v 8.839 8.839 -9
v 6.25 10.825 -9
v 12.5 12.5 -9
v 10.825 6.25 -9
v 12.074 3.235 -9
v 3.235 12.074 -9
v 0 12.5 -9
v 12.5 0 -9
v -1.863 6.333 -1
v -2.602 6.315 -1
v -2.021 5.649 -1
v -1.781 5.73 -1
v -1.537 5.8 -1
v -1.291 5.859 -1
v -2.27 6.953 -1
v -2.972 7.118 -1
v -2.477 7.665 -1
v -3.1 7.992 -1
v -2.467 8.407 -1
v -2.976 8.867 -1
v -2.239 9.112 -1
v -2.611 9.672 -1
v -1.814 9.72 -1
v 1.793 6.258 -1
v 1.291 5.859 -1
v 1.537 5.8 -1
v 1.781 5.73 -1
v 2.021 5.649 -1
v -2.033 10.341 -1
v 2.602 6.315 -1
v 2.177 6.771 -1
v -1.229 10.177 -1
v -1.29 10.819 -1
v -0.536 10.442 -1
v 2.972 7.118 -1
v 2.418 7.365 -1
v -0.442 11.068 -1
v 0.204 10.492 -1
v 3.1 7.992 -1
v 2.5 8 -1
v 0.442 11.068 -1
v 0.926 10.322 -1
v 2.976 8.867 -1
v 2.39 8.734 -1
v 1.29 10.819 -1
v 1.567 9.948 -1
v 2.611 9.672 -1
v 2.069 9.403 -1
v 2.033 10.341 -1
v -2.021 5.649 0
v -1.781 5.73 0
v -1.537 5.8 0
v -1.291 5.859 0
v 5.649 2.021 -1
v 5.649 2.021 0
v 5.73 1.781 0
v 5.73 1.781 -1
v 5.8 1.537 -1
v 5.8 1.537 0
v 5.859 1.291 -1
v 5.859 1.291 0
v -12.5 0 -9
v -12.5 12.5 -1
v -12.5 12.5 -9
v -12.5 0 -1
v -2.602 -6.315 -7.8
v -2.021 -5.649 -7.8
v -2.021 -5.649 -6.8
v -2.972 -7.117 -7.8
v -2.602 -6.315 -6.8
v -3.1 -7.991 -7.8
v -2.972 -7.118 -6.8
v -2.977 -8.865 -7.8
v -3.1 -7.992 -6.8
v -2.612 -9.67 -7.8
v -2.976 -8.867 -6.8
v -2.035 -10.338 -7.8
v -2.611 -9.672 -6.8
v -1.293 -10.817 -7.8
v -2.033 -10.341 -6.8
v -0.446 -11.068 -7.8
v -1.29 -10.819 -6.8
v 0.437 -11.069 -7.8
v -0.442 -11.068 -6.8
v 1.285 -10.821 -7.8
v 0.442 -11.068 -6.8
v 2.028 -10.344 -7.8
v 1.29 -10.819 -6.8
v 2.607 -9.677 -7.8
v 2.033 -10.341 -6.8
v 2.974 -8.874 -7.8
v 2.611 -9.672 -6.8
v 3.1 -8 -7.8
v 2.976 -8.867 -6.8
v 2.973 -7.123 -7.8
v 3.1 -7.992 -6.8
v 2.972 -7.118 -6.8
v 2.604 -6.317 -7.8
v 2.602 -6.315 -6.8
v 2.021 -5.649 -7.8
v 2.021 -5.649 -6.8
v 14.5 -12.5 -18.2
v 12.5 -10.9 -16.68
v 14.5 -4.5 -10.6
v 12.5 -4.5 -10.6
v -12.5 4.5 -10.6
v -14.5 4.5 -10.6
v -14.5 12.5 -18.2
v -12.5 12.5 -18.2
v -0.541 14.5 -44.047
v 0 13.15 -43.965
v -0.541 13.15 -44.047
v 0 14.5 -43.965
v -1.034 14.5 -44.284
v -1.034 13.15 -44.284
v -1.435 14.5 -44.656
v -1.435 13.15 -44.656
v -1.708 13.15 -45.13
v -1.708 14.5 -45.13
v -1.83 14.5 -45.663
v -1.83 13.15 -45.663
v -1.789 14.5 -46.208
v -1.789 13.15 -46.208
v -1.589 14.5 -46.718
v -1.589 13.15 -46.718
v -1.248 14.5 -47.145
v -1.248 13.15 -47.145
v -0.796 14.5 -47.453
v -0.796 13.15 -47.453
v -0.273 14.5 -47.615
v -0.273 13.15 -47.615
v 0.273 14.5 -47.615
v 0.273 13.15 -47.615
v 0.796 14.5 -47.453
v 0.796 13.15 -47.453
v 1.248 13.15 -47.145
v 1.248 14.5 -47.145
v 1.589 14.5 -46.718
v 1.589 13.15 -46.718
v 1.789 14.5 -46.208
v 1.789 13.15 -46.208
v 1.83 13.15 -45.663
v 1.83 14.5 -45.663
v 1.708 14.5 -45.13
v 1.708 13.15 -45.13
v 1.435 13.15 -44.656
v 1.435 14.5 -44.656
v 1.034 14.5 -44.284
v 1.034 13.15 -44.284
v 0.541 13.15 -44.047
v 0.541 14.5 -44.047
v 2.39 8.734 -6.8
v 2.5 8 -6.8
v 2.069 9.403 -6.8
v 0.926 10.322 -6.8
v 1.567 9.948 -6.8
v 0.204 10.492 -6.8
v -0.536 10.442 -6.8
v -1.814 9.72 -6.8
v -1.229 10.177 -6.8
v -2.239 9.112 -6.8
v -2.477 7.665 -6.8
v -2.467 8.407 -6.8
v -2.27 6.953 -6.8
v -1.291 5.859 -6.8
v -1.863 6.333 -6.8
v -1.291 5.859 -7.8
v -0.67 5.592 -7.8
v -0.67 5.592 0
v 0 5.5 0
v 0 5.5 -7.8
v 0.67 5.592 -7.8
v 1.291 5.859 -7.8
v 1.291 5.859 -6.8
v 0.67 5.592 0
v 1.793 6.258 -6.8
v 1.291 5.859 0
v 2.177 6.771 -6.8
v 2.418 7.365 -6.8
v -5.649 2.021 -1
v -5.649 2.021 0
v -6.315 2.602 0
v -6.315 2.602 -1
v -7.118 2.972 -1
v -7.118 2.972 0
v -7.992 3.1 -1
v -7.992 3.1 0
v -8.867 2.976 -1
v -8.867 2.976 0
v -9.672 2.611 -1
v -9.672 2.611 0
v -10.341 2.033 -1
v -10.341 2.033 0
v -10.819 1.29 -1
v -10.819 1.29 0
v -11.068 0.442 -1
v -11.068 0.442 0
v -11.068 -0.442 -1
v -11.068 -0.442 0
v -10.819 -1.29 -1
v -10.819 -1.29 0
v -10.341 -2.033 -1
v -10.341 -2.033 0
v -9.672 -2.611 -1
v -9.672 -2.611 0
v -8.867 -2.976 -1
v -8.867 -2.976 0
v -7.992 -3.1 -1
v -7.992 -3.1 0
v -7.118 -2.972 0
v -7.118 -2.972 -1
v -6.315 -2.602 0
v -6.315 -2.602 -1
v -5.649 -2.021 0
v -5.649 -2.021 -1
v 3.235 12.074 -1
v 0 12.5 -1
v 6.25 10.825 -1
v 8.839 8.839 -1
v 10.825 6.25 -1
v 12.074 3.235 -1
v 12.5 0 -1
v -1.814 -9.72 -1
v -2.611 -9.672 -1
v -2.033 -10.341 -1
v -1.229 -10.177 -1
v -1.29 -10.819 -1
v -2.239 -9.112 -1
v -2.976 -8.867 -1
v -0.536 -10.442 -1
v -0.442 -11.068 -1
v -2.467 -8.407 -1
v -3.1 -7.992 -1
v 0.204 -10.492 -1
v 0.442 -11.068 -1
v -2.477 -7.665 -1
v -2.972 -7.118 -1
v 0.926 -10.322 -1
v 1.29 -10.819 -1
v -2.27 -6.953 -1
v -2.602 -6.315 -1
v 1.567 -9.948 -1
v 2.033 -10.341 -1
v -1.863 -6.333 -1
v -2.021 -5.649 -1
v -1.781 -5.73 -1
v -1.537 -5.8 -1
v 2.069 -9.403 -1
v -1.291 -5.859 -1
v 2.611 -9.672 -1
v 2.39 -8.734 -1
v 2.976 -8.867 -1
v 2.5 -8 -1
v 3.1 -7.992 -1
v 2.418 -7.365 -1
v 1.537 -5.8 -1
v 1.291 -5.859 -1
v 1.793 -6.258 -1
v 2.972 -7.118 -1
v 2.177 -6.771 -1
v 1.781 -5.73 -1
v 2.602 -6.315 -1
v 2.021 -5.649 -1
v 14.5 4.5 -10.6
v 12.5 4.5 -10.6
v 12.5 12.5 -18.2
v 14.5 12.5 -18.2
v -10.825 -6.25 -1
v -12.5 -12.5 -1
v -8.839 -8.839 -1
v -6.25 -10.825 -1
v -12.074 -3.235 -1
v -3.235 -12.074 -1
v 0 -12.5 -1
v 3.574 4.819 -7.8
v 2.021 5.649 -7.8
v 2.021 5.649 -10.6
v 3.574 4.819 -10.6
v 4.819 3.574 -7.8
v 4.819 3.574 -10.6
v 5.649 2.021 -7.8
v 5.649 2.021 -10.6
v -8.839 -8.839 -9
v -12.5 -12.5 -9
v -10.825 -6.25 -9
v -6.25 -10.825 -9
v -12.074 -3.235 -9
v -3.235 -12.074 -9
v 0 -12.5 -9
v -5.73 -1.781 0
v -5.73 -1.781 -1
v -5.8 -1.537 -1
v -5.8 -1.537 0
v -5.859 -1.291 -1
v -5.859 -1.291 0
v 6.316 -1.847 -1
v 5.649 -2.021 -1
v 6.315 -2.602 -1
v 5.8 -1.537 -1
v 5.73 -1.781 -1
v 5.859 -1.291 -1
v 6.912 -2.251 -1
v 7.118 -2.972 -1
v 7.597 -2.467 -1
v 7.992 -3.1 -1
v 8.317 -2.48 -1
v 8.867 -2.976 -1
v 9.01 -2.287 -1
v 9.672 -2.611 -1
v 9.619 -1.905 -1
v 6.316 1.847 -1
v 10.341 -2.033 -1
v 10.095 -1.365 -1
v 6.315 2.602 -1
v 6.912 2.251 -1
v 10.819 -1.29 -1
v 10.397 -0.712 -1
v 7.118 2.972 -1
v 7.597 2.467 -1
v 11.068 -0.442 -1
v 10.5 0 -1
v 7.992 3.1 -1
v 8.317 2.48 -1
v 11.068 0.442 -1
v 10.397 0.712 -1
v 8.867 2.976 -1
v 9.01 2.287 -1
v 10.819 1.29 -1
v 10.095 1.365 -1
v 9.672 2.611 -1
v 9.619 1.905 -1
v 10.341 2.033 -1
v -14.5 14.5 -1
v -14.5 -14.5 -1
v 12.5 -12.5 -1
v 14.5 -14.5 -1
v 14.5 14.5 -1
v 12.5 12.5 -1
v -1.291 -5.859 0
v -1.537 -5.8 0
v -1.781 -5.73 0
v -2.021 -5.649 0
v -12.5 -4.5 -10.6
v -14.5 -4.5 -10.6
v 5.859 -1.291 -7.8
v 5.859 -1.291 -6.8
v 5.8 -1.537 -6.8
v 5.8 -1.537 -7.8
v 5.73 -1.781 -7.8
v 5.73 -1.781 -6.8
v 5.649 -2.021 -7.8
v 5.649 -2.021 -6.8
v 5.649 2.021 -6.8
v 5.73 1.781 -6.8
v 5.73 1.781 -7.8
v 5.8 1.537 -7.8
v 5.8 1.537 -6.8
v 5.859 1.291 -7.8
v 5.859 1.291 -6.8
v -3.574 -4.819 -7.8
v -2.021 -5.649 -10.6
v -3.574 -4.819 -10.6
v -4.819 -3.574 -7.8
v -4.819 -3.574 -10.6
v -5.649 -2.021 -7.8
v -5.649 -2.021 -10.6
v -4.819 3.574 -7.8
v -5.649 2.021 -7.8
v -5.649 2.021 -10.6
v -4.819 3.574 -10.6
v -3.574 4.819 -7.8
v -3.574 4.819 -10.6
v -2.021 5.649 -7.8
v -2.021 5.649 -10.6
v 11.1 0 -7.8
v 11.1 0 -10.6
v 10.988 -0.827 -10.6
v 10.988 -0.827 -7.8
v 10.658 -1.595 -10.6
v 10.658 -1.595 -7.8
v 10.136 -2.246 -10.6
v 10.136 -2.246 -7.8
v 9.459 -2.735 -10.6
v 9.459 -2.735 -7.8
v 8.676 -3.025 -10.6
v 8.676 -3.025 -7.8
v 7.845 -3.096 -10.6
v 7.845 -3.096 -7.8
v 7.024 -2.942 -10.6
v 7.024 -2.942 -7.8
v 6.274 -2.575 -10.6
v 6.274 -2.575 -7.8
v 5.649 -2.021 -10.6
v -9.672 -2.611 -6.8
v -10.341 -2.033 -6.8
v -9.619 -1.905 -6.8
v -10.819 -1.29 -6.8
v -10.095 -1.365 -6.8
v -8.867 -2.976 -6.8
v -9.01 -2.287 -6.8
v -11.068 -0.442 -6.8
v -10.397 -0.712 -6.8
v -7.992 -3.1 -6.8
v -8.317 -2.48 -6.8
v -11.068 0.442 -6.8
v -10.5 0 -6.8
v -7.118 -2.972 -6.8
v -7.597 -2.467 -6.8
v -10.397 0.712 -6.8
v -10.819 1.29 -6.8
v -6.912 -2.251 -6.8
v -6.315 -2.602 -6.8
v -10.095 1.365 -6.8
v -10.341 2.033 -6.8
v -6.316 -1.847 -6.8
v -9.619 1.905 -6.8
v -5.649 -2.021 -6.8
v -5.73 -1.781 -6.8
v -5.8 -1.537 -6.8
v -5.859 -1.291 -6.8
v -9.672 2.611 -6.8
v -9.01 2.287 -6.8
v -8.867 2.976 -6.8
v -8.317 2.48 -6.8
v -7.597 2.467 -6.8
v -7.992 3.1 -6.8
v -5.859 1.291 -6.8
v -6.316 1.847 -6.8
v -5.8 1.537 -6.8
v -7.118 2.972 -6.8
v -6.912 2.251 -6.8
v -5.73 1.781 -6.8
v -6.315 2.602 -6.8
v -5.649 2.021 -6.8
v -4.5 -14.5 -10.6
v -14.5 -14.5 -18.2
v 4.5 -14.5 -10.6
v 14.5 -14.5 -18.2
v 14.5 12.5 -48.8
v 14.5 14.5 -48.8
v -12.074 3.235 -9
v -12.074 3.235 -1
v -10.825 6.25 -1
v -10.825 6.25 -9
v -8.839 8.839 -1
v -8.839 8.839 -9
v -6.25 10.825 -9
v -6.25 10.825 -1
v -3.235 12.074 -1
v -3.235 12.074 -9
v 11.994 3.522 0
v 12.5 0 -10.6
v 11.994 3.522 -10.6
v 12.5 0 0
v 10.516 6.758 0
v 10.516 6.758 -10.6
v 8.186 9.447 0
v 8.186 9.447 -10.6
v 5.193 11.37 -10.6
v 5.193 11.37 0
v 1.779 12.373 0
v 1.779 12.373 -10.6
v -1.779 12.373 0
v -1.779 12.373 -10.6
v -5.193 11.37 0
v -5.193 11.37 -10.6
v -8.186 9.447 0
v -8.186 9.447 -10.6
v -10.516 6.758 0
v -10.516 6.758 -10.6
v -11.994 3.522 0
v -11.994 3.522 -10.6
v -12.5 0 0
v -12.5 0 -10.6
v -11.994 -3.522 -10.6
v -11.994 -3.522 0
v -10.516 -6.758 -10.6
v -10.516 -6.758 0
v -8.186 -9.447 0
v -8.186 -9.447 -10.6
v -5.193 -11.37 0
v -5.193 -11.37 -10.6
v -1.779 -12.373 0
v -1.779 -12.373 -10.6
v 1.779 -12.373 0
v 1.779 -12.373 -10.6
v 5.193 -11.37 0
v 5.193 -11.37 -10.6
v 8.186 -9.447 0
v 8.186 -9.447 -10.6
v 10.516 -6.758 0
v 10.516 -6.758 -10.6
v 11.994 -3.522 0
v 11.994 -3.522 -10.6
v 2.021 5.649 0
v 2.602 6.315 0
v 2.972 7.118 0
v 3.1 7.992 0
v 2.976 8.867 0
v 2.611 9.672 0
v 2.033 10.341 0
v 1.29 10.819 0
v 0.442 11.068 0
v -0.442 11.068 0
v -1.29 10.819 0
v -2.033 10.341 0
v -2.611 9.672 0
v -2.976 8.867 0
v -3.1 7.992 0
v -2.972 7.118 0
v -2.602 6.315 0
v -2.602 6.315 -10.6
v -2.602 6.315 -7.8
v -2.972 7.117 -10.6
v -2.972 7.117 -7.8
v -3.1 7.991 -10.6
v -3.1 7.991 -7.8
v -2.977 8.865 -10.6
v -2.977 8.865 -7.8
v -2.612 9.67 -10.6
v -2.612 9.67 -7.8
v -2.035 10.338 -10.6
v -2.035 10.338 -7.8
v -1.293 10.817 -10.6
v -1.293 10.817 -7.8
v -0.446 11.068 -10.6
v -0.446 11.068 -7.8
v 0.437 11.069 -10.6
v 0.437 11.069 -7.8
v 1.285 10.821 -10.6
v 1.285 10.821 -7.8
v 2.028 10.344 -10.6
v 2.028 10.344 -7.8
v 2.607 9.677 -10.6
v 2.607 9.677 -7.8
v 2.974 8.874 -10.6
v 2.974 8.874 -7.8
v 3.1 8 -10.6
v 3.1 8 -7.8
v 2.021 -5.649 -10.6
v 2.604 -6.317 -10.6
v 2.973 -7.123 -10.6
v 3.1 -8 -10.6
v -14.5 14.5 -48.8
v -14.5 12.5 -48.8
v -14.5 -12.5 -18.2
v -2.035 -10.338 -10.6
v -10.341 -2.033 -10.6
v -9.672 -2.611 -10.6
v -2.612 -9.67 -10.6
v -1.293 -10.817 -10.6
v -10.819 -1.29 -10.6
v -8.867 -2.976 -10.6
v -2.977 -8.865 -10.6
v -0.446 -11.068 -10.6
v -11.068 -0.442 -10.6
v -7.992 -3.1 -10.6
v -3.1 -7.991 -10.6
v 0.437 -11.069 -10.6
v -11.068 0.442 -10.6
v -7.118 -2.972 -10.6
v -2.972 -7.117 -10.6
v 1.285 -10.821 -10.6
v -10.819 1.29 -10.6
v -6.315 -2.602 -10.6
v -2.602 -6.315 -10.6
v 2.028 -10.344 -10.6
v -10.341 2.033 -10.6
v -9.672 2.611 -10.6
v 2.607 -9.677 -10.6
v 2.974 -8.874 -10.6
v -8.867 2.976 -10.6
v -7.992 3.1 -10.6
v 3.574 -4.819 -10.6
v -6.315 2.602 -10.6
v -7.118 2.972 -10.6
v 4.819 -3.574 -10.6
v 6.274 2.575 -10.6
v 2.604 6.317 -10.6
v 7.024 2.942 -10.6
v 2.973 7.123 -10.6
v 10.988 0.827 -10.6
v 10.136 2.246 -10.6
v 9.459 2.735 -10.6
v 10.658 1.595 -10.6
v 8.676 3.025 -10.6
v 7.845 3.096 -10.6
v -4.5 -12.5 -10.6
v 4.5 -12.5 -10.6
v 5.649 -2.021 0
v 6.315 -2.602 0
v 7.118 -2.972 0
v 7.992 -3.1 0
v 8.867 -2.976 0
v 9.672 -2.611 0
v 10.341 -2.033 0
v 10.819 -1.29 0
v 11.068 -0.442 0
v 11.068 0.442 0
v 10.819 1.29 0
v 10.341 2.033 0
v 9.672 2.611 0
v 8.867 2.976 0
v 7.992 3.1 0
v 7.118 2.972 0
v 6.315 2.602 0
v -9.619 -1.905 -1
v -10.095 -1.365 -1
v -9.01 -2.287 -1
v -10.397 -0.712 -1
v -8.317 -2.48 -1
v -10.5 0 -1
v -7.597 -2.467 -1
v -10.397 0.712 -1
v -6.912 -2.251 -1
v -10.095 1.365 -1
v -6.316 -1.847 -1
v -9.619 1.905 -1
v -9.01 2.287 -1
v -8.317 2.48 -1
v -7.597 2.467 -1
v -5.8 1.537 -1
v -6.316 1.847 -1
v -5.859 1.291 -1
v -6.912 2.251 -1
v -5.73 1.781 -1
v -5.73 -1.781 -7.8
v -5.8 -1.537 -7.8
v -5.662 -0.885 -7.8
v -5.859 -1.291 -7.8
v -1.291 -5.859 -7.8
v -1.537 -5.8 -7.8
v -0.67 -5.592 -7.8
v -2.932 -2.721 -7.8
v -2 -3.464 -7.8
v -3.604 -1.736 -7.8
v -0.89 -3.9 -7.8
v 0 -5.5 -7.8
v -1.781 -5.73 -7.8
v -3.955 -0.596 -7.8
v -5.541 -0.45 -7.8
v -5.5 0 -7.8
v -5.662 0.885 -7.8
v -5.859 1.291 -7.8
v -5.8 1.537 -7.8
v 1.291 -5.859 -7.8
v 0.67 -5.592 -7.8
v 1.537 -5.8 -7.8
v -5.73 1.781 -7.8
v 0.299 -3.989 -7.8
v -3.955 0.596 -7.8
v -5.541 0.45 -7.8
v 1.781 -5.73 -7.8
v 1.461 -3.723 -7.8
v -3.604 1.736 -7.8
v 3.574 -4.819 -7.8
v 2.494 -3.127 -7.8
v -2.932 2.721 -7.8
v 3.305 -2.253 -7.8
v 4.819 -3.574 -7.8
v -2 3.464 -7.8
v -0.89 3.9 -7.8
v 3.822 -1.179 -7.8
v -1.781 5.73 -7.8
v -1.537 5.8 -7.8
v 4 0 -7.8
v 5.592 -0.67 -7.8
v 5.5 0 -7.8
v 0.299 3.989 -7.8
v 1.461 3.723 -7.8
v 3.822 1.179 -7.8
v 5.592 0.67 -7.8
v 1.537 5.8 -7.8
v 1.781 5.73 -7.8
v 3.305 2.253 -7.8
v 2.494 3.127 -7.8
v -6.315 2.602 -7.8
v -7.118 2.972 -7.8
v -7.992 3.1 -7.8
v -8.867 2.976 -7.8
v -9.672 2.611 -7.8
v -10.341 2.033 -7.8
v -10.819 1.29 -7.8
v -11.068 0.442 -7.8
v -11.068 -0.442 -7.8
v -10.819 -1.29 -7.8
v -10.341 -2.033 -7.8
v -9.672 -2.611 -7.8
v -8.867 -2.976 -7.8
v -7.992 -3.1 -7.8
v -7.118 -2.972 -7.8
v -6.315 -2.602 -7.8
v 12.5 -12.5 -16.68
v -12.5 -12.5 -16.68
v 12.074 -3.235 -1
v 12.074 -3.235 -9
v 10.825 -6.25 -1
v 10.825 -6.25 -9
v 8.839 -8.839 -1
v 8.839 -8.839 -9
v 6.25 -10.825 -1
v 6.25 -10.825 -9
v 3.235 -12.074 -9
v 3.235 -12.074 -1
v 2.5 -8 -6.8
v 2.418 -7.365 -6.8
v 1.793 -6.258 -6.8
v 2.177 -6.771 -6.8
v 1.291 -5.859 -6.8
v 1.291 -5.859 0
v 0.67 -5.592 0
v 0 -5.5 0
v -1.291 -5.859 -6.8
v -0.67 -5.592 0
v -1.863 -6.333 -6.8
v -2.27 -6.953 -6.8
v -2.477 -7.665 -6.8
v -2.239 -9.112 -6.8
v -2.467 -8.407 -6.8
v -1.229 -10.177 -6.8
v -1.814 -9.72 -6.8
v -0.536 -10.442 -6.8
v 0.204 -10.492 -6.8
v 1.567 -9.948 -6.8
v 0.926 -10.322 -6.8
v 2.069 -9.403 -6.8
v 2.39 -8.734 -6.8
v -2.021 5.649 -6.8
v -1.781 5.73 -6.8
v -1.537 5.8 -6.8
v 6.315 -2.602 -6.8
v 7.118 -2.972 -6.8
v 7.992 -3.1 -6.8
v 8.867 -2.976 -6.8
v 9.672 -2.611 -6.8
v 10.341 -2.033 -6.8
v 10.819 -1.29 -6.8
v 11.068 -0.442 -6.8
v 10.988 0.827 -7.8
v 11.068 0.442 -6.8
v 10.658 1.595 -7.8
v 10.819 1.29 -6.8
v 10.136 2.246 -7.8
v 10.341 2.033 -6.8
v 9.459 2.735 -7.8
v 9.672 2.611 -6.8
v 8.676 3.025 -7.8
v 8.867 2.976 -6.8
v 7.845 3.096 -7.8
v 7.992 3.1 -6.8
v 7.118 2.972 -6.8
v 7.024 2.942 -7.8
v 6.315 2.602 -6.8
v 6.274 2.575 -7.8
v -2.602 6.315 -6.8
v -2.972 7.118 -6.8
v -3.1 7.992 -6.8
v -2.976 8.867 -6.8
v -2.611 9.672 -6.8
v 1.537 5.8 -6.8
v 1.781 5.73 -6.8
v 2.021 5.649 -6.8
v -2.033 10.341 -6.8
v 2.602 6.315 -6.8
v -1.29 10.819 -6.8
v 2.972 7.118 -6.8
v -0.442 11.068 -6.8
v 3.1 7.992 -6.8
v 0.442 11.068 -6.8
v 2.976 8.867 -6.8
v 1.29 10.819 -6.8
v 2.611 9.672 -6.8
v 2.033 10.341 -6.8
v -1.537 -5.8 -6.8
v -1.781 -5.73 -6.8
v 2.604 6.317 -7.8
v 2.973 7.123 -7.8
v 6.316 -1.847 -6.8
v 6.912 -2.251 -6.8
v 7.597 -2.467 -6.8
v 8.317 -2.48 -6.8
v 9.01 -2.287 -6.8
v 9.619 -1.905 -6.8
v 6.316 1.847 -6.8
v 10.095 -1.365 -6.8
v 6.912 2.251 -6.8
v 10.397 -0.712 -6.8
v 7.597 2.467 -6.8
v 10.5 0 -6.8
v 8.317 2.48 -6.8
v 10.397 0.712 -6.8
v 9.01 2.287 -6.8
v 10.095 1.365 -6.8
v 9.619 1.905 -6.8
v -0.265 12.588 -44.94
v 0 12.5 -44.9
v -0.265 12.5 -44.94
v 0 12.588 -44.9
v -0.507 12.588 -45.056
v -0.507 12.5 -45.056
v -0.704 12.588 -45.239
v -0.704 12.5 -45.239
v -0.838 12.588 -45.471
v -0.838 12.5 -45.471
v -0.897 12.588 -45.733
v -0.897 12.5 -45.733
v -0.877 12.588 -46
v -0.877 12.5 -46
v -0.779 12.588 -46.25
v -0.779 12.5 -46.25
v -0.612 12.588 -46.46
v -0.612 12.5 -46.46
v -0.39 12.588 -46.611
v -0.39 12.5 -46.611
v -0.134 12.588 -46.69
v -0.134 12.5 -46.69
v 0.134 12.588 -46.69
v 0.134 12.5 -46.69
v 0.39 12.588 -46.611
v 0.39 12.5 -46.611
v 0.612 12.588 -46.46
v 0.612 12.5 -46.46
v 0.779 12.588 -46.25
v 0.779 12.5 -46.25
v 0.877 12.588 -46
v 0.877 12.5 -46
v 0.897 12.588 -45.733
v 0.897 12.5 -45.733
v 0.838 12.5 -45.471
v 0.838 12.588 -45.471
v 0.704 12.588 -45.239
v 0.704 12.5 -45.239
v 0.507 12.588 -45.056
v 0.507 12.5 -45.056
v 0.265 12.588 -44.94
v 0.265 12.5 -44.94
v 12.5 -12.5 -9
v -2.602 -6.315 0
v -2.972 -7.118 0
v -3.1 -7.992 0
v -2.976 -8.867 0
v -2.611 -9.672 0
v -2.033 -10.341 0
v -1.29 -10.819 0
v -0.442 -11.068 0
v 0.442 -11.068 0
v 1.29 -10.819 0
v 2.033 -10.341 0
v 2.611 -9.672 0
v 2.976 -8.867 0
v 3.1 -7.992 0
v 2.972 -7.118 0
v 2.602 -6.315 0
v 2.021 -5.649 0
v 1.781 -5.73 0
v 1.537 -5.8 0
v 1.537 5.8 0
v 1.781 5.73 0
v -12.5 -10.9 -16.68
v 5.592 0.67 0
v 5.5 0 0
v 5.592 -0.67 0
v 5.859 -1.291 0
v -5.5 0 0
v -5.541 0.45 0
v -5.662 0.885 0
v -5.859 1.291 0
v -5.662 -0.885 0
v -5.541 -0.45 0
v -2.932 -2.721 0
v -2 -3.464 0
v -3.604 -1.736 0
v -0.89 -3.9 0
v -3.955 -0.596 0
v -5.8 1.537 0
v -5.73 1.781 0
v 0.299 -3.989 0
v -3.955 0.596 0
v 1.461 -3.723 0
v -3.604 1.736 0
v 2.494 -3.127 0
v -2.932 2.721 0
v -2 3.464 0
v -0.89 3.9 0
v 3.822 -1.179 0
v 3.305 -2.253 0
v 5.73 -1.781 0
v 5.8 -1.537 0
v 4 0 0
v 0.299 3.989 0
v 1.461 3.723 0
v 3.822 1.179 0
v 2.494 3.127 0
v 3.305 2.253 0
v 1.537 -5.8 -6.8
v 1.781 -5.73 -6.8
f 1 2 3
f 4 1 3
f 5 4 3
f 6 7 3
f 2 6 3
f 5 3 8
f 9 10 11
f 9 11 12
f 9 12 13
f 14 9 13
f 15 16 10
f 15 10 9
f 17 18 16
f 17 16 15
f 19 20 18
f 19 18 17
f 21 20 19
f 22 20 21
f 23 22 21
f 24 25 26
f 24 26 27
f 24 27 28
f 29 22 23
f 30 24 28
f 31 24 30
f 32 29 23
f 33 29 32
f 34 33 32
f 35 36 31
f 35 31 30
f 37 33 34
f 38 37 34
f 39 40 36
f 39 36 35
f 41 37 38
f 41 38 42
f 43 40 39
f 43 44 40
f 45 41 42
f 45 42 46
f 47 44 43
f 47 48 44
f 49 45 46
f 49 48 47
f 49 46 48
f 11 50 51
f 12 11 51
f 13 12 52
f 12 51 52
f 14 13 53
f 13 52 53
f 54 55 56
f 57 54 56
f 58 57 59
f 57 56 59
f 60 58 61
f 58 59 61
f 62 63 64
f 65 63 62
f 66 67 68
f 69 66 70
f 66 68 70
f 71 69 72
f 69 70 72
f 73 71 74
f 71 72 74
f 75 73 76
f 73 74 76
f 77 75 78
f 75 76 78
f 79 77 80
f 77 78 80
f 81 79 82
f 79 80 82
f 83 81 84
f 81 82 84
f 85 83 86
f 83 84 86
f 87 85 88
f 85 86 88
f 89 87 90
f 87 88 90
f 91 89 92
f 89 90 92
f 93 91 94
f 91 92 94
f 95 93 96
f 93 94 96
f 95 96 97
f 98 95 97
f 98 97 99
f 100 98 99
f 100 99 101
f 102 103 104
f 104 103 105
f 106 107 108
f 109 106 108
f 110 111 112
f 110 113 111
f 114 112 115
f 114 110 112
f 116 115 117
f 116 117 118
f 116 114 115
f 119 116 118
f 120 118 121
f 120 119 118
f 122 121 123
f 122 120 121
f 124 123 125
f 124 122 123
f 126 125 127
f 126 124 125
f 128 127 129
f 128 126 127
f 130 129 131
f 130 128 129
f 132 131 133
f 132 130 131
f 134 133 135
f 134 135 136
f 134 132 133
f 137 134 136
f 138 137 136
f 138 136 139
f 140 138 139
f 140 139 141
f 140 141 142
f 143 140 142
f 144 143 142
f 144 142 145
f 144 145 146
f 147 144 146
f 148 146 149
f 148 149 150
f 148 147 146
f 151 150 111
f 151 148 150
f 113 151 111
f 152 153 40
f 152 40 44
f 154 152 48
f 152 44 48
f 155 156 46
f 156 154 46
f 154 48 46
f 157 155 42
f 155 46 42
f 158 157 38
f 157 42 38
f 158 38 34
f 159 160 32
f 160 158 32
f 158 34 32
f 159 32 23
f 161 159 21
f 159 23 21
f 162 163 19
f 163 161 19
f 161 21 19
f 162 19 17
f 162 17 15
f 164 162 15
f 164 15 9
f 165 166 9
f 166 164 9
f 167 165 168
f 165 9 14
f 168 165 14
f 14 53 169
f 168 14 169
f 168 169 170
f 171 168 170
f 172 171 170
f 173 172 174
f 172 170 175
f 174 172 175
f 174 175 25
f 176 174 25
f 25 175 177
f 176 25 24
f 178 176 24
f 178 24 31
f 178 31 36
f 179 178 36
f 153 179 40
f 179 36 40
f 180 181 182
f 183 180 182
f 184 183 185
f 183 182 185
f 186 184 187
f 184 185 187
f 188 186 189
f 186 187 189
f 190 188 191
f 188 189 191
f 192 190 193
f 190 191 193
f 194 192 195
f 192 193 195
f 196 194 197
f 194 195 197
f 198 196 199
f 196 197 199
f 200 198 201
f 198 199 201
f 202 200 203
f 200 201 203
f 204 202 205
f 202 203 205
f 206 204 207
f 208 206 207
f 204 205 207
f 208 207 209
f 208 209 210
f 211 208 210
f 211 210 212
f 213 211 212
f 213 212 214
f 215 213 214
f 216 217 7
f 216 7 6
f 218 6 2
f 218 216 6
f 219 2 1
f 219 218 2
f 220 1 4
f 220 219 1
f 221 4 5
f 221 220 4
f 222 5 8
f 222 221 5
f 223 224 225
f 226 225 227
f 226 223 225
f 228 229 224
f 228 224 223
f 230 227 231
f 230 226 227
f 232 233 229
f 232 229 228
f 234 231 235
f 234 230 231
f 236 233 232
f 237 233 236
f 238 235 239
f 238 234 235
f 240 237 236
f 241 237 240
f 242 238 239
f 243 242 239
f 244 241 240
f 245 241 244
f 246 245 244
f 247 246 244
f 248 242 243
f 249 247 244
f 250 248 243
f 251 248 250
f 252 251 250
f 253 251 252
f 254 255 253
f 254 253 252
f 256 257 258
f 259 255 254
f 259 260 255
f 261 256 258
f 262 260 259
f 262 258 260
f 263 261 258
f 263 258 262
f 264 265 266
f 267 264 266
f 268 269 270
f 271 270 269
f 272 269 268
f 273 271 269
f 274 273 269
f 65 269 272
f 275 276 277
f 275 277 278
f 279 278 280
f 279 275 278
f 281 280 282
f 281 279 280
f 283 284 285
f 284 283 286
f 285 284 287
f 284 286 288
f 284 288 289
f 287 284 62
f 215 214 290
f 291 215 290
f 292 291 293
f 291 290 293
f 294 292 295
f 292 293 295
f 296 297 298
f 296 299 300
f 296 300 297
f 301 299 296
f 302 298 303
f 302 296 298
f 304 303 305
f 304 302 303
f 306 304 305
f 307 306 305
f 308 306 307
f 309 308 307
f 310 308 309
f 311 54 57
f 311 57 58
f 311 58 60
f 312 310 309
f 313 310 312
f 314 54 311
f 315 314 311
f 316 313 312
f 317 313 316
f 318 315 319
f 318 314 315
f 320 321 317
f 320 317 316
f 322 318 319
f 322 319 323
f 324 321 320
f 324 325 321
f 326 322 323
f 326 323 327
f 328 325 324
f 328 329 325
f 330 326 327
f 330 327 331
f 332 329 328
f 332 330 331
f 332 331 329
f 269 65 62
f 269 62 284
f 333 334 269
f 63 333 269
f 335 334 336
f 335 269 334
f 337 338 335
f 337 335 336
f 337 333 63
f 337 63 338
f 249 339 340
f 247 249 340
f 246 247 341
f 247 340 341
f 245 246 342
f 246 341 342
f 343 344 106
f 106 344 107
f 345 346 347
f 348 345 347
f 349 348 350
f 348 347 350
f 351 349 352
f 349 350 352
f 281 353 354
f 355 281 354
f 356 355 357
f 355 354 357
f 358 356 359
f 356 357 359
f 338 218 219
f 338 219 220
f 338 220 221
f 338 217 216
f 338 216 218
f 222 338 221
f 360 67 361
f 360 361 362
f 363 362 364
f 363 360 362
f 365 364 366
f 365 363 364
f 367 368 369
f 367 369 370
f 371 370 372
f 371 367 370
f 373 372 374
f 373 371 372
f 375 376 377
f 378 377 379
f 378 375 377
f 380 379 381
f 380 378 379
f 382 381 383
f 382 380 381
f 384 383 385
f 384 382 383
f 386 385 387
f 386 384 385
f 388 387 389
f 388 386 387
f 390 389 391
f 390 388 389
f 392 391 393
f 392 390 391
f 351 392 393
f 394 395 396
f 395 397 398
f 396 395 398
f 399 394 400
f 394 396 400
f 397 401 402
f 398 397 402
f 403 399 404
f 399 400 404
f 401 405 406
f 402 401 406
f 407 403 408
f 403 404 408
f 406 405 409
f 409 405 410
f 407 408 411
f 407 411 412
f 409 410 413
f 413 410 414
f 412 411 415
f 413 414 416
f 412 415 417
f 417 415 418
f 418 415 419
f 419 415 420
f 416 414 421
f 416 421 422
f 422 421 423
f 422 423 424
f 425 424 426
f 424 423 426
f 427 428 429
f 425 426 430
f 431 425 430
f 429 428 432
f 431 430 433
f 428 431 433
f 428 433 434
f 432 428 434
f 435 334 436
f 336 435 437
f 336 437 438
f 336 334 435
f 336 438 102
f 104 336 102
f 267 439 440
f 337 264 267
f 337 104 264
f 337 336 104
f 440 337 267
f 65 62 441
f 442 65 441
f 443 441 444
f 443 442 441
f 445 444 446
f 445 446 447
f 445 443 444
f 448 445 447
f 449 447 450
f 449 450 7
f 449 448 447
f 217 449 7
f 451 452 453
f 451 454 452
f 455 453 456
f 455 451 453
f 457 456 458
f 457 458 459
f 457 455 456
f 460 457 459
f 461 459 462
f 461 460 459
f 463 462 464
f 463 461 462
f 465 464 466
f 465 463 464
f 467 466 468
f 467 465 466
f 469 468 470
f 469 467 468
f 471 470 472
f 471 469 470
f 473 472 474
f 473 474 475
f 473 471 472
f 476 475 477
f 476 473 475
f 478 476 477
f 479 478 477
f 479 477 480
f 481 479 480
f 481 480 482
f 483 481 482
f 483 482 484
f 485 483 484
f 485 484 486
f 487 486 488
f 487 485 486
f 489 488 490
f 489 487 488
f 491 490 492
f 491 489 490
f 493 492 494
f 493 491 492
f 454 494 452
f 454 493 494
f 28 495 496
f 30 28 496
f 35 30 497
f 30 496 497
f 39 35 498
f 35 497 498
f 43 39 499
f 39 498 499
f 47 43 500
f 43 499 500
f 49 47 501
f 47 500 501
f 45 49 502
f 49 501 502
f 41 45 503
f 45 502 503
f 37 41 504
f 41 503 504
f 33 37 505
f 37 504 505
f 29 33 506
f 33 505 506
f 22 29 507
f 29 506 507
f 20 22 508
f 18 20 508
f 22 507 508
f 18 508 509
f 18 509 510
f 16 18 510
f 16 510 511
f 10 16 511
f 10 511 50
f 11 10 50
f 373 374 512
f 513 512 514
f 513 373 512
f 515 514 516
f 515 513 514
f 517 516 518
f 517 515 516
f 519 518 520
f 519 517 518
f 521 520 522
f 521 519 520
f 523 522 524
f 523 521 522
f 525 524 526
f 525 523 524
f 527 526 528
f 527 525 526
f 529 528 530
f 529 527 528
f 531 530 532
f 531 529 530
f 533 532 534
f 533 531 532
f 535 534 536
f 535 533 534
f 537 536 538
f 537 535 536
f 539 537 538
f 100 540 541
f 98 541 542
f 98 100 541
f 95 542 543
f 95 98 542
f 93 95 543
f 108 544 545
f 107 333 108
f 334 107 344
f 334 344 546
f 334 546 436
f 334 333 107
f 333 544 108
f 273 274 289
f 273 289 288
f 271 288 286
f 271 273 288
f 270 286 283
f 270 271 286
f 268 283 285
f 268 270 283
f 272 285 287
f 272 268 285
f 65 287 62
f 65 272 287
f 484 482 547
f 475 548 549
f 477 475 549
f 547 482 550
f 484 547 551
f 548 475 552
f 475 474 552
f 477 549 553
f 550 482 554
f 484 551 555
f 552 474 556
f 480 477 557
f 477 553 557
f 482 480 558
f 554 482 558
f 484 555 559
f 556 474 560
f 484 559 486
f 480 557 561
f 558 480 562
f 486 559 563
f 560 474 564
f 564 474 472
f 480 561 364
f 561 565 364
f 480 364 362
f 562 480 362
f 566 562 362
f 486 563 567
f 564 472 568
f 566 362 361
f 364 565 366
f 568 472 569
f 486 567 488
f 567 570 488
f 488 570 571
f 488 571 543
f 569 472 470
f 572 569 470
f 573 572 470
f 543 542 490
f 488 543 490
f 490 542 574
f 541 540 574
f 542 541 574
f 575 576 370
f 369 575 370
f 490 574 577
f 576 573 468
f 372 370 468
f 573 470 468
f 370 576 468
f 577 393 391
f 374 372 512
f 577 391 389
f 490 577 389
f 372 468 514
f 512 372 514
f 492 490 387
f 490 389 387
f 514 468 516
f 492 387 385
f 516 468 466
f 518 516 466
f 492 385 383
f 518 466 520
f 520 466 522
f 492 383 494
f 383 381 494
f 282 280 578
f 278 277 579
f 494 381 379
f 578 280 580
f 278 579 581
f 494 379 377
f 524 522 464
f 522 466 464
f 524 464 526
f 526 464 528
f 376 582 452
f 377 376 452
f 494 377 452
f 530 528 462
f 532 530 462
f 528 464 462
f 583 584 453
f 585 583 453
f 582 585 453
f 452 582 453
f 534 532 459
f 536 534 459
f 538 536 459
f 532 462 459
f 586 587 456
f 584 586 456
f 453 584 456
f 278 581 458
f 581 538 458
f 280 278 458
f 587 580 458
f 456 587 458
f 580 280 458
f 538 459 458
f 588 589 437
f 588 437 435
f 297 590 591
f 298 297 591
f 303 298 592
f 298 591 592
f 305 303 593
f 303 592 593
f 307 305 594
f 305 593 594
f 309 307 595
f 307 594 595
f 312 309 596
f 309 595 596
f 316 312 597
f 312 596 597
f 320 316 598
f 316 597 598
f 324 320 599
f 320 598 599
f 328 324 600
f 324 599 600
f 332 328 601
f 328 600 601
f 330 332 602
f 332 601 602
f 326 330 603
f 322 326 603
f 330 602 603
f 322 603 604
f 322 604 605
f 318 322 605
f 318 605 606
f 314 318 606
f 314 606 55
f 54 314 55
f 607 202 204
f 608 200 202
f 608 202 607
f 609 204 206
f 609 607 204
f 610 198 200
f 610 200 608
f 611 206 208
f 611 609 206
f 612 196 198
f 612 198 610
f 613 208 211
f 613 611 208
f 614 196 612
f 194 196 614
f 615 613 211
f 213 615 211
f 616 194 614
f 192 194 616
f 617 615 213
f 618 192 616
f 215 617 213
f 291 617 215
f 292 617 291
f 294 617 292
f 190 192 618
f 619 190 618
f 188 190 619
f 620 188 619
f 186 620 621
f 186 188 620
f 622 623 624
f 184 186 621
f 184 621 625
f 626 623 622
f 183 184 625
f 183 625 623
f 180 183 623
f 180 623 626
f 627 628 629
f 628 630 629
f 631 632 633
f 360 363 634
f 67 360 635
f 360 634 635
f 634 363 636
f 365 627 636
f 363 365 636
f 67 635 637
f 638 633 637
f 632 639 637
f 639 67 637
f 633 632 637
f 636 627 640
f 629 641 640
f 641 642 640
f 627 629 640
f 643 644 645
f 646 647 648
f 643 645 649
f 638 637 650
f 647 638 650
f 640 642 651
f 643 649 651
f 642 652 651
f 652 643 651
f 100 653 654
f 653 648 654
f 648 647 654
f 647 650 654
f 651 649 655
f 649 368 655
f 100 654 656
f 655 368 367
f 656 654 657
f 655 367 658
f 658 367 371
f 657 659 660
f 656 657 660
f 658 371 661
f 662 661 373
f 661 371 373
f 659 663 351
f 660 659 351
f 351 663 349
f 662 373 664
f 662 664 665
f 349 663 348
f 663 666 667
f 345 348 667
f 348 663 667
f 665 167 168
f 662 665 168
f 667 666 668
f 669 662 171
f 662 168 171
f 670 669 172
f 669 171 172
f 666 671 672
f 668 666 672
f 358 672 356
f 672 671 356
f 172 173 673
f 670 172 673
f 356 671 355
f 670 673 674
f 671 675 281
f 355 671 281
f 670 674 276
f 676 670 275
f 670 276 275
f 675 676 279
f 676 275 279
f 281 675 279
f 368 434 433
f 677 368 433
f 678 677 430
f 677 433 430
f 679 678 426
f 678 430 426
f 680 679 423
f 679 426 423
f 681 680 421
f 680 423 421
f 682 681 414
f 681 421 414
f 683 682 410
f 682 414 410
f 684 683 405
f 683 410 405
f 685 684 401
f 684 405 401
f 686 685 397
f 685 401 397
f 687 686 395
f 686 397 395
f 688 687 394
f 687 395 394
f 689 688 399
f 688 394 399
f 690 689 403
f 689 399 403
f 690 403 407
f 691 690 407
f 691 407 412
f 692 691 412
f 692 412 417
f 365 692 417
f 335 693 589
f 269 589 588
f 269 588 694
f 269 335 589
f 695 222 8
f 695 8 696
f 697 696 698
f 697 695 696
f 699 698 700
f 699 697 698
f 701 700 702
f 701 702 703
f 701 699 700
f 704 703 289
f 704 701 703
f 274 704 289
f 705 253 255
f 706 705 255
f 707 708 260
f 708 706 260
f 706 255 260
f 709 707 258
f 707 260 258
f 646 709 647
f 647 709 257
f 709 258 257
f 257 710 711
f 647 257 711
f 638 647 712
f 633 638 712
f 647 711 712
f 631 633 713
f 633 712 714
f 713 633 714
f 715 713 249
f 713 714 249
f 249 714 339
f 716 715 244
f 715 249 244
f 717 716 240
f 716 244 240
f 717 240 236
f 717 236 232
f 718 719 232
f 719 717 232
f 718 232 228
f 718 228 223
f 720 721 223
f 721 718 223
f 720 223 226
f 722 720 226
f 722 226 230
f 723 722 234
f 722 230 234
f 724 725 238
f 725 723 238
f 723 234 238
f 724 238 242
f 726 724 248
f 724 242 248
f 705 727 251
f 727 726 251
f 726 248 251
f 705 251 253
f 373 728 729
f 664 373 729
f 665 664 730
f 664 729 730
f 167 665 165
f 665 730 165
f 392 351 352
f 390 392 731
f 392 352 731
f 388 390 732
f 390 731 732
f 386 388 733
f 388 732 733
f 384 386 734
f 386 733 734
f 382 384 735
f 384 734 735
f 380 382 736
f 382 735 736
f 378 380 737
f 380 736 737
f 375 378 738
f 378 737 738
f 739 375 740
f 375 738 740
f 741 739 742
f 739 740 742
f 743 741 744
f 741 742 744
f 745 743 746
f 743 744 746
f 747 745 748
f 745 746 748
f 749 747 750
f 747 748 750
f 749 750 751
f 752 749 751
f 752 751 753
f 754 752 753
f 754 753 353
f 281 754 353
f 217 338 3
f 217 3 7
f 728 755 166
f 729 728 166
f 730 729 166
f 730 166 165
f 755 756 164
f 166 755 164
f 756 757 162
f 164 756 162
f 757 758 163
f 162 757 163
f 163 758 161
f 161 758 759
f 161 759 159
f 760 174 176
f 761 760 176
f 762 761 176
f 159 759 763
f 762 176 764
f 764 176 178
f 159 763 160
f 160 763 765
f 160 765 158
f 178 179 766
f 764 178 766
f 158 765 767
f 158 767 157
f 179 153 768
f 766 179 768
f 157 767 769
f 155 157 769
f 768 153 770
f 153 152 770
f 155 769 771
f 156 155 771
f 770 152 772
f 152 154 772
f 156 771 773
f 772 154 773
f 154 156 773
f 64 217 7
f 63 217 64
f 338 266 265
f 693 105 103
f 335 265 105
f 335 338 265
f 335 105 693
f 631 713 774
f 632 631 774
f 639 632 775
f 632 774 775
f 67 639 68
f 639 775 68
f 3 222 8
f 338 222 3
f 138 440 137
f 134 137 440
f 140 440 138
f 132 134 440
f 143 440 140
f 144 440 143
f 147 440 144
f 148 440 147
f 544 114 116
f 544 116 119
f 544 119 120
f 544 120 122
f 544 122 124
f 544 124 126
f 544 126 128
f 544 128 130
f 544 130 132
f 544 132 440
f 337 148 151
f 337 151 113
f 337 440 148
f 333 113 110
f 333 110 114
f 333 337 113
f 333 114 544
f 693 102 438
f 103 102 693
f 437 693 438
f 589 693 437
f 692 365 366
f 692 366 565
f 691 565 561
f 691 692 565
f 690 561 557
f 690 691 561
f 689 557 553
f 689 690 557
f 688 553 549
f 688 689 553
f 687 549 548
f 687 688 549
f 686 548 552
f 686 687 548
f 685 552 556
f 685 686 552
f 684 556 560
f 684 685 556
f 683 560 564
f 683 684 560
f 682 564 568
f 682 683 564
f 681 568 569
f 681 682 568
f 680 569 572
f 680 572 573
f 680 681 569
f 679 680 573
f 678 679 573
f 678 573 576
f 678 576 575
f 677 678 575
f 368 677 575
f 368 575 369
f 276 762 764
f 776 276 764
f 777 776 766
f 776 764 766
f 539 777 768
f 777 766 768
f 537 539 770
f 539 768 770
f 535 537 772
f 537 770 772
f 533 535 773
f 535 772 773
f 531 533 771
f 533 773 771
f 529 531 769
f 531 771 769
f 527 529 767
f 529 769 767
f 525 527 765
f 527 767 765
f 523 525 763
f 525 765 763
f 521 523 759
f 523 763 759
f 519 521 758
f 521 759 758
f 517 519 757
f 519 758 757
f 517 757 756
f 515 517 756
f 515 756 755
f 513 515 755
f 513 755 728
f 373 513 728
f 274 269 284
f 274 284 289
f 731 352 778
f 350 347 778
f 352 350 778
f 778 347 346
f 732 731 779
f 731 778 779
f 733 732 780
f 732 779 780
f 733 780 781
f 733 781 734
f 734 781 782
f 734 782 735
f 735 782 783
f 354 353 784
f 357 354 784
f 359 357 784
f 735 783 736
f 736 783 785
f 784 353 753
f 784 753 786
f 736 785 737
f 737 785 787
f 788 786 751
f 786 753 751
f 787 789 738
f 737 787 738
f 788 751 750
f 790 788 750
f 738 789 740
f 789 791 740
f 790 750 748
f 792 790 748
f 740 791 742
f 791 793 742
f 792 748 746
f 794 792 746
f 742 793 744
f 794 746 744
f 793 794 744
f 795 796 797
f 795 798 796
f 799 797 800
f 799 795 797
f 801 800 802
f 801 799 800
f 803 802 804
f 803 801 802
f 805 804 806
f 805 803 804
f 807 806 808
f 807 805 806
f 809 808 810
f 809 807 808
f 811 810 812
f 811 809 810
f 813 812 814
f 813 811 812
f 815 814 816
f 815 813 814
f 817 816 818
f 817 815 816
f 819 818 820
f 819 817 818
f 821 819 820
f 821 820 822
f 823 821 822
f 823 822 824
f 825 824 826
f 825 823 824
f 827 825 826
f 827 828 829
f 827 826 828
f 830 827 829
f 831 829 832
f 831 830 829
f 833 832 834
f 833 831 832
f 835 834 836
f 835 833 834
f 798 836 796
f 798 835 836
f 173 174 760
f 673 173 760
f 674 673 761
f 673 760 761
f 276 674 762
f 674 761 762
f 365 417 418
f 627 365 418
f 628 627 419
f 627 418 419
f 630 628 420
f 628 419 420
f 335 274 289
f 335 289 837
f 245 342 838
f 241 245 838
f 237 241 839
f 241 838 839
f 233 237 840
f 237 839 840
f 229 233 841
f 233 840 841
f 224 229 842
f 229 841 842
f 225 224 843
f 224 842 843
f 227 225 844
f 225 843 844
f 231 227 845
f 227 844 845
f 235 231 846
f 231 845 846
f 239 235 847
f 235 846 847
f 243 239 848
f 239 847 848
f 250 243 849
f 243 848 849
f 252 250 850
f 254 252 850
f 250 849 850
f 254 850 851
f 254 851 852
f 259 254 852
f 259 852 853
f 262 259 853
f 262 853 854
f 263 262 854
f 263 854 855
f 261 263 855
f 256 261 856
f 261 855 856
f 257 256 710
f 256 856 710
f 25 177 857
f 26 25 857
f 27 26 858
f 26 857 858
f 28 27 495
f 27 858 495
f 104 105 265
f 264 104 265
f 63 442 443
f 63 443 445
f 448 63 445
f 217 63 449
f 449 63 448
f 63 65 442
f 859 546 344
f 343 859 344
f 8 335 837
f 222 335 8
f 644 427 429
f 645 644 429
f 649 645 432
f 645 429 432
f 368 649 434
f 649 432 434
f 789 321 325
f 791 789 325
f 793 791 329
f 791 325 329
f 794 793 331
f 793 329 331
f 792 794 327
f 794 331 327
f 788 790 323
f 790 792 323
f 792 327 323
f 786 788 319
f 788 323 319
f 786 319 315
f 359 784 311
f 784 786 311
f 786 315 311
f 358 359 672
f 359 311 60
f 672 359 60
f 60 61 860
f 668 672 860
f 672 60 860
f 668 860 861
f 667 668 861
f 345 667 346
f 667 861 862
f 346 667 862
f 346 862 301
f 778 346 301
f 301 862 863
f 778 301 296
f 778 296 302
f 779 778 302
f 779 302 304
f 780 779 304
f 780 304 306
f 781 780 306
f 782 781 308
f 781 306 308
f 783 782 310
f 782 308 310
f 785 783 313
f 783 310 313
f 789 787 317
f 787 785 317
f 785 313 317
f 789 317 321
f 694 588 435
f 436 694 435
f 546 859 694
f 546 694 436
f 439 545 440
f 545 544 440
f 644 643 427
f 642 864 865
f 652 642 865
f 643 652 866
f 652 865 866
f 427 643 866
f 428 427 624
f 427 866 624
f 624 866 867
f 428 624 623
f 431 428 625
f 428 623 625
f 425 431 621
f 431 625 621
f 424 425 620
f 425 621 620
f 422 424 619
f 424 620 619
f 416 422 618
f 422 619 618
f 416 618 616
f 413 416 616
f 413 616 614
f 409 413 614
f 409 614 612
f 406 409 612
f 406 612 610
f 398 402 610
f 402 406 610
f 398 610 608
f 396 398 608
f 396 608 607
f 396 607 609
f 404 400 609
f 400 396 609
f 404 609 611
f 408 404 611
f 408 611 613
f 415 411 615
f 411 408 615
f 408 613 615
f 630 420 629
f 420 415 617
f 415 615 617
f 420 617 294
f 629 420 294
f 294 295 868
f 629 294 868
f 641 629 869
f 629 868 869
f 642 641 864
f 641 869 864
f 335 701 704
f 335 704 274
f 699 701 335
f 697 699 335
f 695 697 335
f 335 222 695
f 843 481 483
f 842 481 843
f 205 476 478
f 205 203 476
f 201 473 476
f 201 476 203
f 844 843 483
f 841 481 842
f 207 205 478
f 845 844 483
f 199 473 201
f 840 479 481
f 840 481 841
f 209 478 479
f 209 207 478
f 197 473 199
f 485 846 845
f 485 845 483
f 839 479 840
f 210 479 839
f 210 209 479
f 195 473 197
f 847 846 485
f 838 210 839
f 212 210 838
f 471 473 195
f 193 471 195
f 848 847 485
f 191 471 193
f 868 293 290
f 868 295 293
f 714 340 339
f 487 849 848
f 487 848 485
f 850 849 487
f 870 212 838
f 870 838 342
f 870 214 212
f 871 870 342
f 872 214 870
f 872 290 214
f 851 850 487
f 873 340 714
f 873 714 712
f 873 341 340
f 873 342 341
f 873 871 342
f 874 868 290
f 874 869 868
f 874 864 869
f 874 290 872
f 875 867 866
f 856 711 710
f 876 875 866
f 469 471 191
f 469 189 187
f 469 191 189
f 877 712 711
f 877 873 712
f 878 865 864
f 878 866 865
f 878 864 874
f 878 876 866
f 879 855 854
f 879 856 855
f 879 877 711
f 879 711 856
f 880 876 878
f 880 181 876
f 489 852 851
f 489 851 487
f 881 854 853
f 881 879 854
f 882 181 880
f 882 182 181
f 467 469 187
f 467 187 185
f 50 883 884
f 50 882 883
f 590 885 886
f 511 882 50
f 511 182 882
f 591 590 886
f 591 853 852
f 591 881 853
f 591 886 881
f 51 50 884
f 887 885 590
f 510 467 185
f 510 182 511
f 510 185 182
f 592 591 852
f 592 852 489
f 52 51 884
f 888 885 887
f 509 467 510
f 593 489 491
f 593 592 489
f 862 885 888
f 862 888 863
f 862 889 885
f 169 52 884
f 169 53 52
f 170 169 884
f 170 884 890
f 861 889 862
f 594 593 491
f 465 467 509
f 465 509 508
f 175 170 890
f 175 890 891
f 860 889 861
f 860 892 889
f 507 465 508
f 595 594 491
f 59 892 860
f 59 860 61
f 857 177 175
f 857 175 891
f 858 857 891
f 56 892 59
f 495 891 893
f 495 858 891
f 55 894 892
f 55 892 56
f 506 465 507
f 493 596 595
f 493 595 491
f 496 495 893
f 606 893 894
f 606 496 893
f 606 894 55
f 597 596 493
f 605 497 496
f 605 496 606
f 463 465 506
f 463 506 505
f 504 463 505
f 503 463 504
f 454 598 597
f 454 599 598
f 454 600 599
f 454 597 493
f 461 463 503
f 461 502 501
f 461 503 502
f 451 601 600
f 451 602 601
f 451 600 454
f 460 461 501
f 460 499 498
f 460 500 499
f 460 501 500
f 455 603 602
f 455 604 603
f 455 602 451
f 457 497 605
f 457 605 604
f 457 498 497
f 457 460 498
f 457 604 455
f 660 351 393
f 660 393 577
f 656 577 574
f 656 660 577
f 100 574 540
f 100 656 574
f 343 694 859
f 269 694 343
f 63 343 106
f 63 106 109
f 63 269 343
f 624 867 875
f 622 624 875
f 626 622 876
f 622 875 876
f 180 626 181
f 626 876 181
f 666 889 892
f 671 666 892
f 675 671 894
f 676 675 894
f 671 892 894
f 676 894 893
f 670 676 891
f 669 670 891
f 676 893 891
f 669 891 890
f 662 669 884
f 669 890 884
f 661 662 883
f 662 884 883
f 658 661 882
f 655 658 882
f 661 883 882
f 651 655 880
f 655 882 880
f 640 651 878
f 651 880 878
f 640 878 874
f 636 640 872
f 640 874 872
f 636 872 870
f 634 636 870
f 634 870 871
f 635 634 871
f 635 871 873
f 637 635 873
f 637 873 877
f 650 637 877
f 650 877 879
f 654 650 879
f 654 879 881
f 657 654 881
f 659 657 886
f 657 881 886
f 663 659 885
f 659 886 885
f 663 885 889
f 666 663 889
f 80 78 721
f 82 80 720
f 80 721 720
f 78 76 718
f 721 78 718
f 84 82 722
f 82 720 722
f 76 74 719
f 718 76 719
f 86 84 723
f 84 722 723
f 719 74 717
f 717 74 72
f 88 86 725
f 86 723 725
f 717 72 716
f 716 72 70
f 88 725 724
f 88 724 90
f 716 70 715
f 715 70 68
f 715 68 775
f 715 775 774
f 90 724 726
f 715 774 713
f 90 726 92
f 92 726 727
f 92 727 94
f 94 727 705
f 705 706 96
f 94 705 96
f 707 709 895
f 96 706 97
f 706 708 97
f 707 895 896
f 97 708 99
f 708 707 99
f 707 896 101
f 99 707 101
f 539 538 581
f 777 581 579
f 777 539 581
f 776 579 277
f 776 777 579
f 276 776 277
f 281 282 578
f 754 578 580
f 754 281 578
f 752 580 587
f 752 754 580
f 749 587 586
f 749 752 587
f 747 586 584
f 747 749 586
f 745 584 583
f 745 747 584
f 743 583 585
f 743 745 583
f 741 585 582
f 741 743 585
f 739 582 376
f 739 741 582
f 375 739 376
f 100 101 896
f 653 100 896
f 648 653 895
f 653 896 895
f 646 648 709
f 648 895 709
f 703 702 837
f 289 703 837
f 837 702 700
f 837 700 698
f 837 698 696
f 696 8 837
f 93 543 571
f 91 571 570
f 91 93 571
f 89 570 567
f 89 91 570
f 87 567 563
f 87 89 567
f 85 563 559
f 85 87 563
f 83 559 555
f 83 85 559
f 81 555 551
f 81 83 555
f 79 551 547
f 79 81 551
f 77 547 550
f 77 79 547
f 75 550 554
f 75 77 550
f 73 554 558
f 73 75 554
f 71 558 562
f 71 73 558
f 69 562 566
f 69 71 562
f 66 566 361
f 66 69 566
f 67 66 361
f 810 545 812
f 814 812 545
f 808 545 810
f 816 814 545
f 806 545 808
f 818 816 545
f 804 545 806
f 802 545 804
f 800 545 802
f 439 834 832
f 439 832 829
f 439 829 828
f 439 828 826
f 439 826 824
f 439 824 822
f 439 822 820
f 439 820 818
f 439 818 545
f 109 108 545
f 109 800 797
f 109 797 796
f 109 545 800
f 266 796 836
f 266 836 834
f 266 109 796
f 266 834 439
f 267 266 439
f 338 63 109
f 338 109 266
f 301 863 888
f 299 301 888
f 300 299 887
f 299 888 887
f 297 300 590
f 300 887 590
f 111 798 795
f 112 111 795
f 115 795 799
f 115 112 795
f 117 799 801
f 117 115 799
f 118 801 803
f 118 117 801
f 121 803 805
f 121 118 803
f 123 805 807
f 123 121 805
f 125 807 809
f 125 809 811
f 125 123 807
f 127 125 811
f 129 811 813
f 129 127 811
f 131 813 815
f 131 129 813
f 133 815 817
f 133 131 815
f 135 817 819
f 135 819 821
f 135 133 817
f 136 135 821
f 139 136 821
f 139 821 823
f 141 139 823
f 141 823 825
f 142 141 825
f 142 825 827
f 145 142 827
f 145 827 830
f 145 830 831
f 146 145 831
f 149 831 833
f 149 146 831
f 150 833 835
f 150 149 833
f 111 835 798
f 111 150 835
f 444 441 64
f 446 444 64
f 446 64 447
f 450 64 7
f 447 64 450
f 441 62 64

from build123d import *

# Parameters (mm, degrees)
SKETCH_3_R          = 12.5
SKETCH_3_R_2        = 4
SKETCH_3_R_3        = 2.5
EXTRUDE_2_DEPTH     = 7.8
CUT_EXTRUDE_1_DEPTH = 1
CUT_EXTRUDE_START   = -6.8
CUT_EXTRUDE_2_DEPTH = 1
EXTRUDE_START       = -7.8
SKETCH_3_6_R        = 12.5
EXTRUDE_3_DEPTH     = 2.8
EXTRUDE_START_2     = -1
EXTRUDE_4_DEPTH     = 8
EXTRUDE_4_2_DEPTH   = 8
EXTRUDE_4_3_DEPTH   = 8
EXTRUDE_4_4_DEPTH   = 8
EXTRUDE_6_DEPTH     = 17.2
EXTRUDE_START_3     = -18.2
EXTRUDE_13_DEPTH    = 30.6
CUT_EXTRUDE_3_DEPTH = 59.58916282
CUT_EXTRUDE_START_2 = -3.6
CUT_EXTRUDE_4_DEPTH = 3.6


with BuildPart() as part:
    # 草图3 → 凸台-拉伸2 (new body)
    with BuildSketch(Plane.XY):
        Circle(SKETCH_3_R)
        Circle(SKETCH_3_R_2, mode=Mode.SUBTRACT)
        with Locations((0, 8)):
            Circle(SKETCH_3_R_3, mode=Mode.SUBTRACT)
        with Locations((8, 0)):
            Circle(SKETCH_3_R_3, mode=Mode.SUBTRACT)
        with Locations((0, -8)):
            Circle(SKETCH_3_R_3, mode=Mode.SUBTRACT)
        with Locations((-8, 0)):
            Circle(SKETCH_3_R_3, mode=Mode.SUBTRACT)
    extrude(amount=-EXTRUDE_2_DEPTH)

    # 草图3<3> → 切除-拉伸1 (cut)
    with BuildSketch(Plane.XY):
        with BuildLine():
            ThreePointArc((2.021029963, 5.649375), (0, 11.1), (-2.021029963, 5.649375))
            ThreePointArc((-2.021029963, 5.649375), (-1.659542073, 5.765927515), (-1.291404123, 5.859375))
            ThreePointArc((-1.291404123, 5.859375), (0, 10.5), (1.291404123, 5.859375))
            ThreePointArc((1.291404123, 5.859375), (1.659542073, 5.765927515), (2.021029963, 5.649375))
        make_face()
        with BuildLine():
            ThreePointArc((-5.859375, 1.291404123), (-5.765927515, 1.659542073), (-5.649375, 2.021029963))
            ThreePointArc((-5.649375, 2.021029963), (-11.1, 0), (-5.649375, -2.021029963))
            ThreePointArc((-5.649375, -2.021029963), (-5.765927515, -1.659542073), (-5.859375, -1.291404123))
            ThreePointArc((-5.859375, -1.291404123), (-10.5, 0), (-5.859375, 1.291404123))
        make_face()
        with BuildLine():
            ThreePointArc((5.649375, -2.021029963), (11.1, 0), (5.649375, 2.021029963))
            ThreePointArc((5.649375, 2.021029963), (5.765927515, 1.659542073), (5.859375, 1.291404123))
            ThreePointArc((5.859375, 1.291404123), (10.5, 0), (5.859375, -1.291404123))
            ThreePointArc((5.859375, -1.291404123), (5.765927515, -1.659542073), (5.649375, -2.021029963))
        make_face()
        with BuildLine():
            ThreePointArc((-1.291404123, -5.859375), (-1.659542073, -5.765927515), (-2.021029963, -5.649375))
            ThreePointArc((-2.021029963, -5.649375), (0, -11.1), (2.021029963, -5.649375))
            ThreePointArc((2.021029963, -5.649375), (1.659542073, -5.765927515), (1.291404123, -5.859375))
            ThreePointArc((1.291404123, -5.859375), (0, -10.5), (-1.291404123, -5.859375))
        make_face()
    extrude(amount=-CUT_EXTRUDE_1_DEPTH, mode=Mode.SUBTRACT)

    # 草图3<4> → 切除-拉伸2 (cut)
    with BuildSketch(Plane.XY.offset(CUT_EXTRUDE_START)):
        with BuildLine():
            ThreePointArc((2.021029963, 5.649375), (0, 11.1), (-2.021029963, 5.649375))
            ThreePointArc((-2.021029963, 5.649375), (-1.659542073, 5.765927515), (-1.291404123, 5.859375))
            ThreePointArc((-1.291404123, 5.859375), (0, 10.5), (1.291404123, 5.859375))
            ThreePointArc((1.291404123, 5.859375), (1.659542073, 5.765927515), (2.021029963, 5.649375))
        make_face()
        with BuildLine():
            ThreePointArc((-5.859375, 1.291404123), (-5.765927515, 1.659542073), (-5.649375, 2.021029963))
            ThreePointArc((-5.649375, 2.021029963), (-11.1, 0), (-5.649375, -2.021029963))
            ThreePointArc((-5.649375, -2.021029963), (-5.765927515, -1.659542073), (-5.859375, -1.291404123))
            ThreePointArc((-5.859375, -1.291404123), (-10.5, 0), (-5.859375, 1.291404123))
        make_face()
        with BuildLine():
            ThreePointArc((5.649375, -2.021029963), (11.1, 0), (5.649375, 2.021029963))
            ThreePointArc((5.649375, 2.021029963), (5.765927515, 1.659542073), (5.859375, 1.291404123))
            ThreePointArc((5.859375, 1.291404123), (10.5, 0), (5.859375, -1.291404123))
            ThreePointArc((5.859375, -1.291404123), (5.765927515, -1.659542073), (5.649375, -2.021029963))
        make_face()
        with BuildLine():
            ThreePointArc((-1.291404123, -5.859375), (-1.659542073, -5.765927515), (-2.021029963, -5.649375))
            ThreePointArc((-2.021029963, -5.649375), (0, -11.1), (2.021029963, -5.649375))
            ThreePointArc((2.021029963, -5.649375), (1.659542073, -5.765927515), (1.291404123, -5.859375))
            ThreePointArc((1.291404123, -5.859375), (0, -10.5), (-1.291404123, -5.859375))
        make_face()
    extrude(amount=-CUT_EXTRUDE_2_DEPTH, mode=Mode.SUBTRACT)

    # 草图3<6> → 凸台-拉伸3 (add)
    with BuildSketch(Plane.XY.offset(EXTRUDE_START)):
        Circle(SKETCH_3_6_R)
        with BuildLine():
            ThreePointArc((-2.021029963, 5.649375), (-1.293214429, 10.817374033), (3.1, 8))
            ThreePointArc((3.1, 8), (2.817374033, 6.706785571), (2.021029963, 5.649375))
            ThreePointArc((2.021029963, 5.649375), (4.242640687, 4.242640687), (5.649375, 2.021029963))
            ThreePointArc((5.649375, 2.021029963), (9.077743592, 2.906624976), (11.1, 0))
            ThreePointArc((11.1, 0), (9.077743592, -2.906624976), (5.649375, -2.021029963))
            ThreePointArc((5.649375, -2.021029963), (4.242640687, -4.242640687), (2.021029963, -5.649375))
            ThreePointArc((2.021029963, -5.649375), (2.817374033, -6.706785571), (3.1, -8))
            ThreePointArc((3.1, -8), (-1.293214429, -10.817374033), (-2.021029963, -5.649375))
            ThreePointArc((-2.021029963, -5.649375), (-4.242640687, -4.242640687), (-5.649375, -2.021029963))
            ThreePointArc((-5.649375, -2.021029963), (-11.1, 0), (-5.649375, 2.021029963))
            ThreePointArc((-5.649375, 2.021029963), (-4.242640687, 4.242640687), (-2.021029963, 5.649375))
        make_face(mode=Mode.SUBTRACT)
    extrude(amount=-EXTRUDE_3_DEPTH)


with BuildPart() as body_2:
    # 草图5 → 凸台-拉伸4 (new body)
    with BuildSketch(Plane.XY.offset(EXTRUDE_START_2)):
        with BuildLine():
            Line((12.5, -12.5), (12.5, 0))
            ThreePointArc((12.5, 0), (8.838834769, -8.838834761), (1.2e-08, -12.5))
            Line((1.2e-08, -12.5), (12.5, -12.5))
        make_face()
    extrude(amount=-EXTRUDE_4_DEPTH)


with BuildPart() as body_3:
    # 草图5 → Extrude 4 2 (new body)
    with BuildSketch(Plane.XY.offset(EXTRUDE_START_2)):
        with BuildLine():
            ThreePointArc((1.2e-08, -12.5), (-8.838834762, -8.838834768), (-12.5, 4e-09))
            Line((-12.5, 4e-09), (-12.5, -12.5))
            Line((-12.5, -12.5), (1.2e-08, -12.5))
        make_face()
    extrude(amount=-EXTRUDE_4_2_DEPTH)


with BuildPart() as body_4:
    # 草图5 → Extrude 4 3 (new body)
    with BuildSketch(Plane.XY.offset(EXTRUDE_START_2)):
        with BuildLine():
            Line((12.5, 12.5), (-1.7e-08, 12.5))
            ThreePointArc((-1.7e-08, 12.5), (8.838834759, 8.838834771), (12.5, 0))
            Line((12.5, 0), (12.5, 12.5))
        make_face()
    extrude(amount=-EXTRUDE_4_3_DEPTH)


with BuildPart() as body_5:
    # 草图5 → Extrude 4 4 (new body)
    with BuildSketch(Plane.XY.offset(EXTRUDE_START_2)):
        with BuildLine():
            Line((-1.7e-08, 12.5), (-12.5, 12.5))
            Line((-12.5, 12.5), (-12.5, 4e-09))
            ThreePointArc((-12.5, 4e-09), (-8.838834769, 8.83883476), (-1.7e-08, 12.5))
        make_face()
    extrude(amount=-EXTRUDE_4_4_DEPTH)


with BuildPart() as body_6:
    # 草图5<5> → 凸台-拉伸6 (new body)
    with BuildSketch(Plane.XY.offset(EXTRUDE_START_2)):
        Polygon((-12.5, 2.4e-08), (-12.5, 12.5), (-14.5, 12.5), (-14.5, -14.5), (14.5, -14.5), (14.5, 12.5), (12.5, 12.5), (12.5, 0), (12.5, -12.5), (2.4e-08, -12.5), (-12.5, -12.5), align=None)
        Polygon((-14.5, 12.5), (-12.5, 12.5), (0, 12.5), (12.5, 12.5), (14.5, 12.5), (14.5, 14.5), (-14.5, 14.5), align=None)
    extrude(amount=-EXTRUDE_6_DEPTH)

    # 草图5<7> → 凸台-拉伸13 (add)
    with BuildSketch(Plane.XY.offset(EXTRUDE_START_3)):
        Polygon((-14.5, 12.5), (-12.5, 12.5), (0, 12.5), (12.5, 12.5), (14.5, 12.5), (14.5, 14.5), (-14.5, 14.5), align=None)
    extrude(amount=-EXTRUDE_13_DEPTH)

    # 草图8 → 切除-拉伸3 (cut, through all)
    with BuildSketch(Plane.ZY.offset(14.5)):
        Polygon((-10.6, -4.5), (-10.6, 4.5), (-18.2, 12.5), (-18.2, -12.5), align=None)
    extrude(amount=-CUT_EXTRUDE_3_DEPTH, mode=Mode.SUBTRACT)

    # 草图9 → 切除-拉伸4 (cut)
    with BuildSketch(Plane.XZ.offset(14.5).offset(CUT_EXTRUDE_START_2)):
        Polygon((-14.5, -18.2), (14.5, -18.2), (4.5, -10.6), (-4.5, -10.6), align=None)
    extrude(amount=CUT_EXTRUDE_4_DEPTH, mode=Mode.SUBTRACT)

    # 草图10 → 孔1 (revolve, cut)
    with BuildSketch(Plane(origin=(0, 14.5, -45.8), x_dir=(0, 0, 1), z_dir=(1, 0, 0))):
        Polygon((0, 0), (0, 5.35), (0.9, 5.35), (0.9, 1.911804679), (1.835, 1.35), (1.835, 0), align=None)
    revolve(axis=Axis((0, 20.630023899, -45.8), (0, -1, 0)), mode=Mode.SUBTRACT)


solid = Compound([part.part, body_2.part, body_3.part, body_4.part, body_5.part, body_6.part])
